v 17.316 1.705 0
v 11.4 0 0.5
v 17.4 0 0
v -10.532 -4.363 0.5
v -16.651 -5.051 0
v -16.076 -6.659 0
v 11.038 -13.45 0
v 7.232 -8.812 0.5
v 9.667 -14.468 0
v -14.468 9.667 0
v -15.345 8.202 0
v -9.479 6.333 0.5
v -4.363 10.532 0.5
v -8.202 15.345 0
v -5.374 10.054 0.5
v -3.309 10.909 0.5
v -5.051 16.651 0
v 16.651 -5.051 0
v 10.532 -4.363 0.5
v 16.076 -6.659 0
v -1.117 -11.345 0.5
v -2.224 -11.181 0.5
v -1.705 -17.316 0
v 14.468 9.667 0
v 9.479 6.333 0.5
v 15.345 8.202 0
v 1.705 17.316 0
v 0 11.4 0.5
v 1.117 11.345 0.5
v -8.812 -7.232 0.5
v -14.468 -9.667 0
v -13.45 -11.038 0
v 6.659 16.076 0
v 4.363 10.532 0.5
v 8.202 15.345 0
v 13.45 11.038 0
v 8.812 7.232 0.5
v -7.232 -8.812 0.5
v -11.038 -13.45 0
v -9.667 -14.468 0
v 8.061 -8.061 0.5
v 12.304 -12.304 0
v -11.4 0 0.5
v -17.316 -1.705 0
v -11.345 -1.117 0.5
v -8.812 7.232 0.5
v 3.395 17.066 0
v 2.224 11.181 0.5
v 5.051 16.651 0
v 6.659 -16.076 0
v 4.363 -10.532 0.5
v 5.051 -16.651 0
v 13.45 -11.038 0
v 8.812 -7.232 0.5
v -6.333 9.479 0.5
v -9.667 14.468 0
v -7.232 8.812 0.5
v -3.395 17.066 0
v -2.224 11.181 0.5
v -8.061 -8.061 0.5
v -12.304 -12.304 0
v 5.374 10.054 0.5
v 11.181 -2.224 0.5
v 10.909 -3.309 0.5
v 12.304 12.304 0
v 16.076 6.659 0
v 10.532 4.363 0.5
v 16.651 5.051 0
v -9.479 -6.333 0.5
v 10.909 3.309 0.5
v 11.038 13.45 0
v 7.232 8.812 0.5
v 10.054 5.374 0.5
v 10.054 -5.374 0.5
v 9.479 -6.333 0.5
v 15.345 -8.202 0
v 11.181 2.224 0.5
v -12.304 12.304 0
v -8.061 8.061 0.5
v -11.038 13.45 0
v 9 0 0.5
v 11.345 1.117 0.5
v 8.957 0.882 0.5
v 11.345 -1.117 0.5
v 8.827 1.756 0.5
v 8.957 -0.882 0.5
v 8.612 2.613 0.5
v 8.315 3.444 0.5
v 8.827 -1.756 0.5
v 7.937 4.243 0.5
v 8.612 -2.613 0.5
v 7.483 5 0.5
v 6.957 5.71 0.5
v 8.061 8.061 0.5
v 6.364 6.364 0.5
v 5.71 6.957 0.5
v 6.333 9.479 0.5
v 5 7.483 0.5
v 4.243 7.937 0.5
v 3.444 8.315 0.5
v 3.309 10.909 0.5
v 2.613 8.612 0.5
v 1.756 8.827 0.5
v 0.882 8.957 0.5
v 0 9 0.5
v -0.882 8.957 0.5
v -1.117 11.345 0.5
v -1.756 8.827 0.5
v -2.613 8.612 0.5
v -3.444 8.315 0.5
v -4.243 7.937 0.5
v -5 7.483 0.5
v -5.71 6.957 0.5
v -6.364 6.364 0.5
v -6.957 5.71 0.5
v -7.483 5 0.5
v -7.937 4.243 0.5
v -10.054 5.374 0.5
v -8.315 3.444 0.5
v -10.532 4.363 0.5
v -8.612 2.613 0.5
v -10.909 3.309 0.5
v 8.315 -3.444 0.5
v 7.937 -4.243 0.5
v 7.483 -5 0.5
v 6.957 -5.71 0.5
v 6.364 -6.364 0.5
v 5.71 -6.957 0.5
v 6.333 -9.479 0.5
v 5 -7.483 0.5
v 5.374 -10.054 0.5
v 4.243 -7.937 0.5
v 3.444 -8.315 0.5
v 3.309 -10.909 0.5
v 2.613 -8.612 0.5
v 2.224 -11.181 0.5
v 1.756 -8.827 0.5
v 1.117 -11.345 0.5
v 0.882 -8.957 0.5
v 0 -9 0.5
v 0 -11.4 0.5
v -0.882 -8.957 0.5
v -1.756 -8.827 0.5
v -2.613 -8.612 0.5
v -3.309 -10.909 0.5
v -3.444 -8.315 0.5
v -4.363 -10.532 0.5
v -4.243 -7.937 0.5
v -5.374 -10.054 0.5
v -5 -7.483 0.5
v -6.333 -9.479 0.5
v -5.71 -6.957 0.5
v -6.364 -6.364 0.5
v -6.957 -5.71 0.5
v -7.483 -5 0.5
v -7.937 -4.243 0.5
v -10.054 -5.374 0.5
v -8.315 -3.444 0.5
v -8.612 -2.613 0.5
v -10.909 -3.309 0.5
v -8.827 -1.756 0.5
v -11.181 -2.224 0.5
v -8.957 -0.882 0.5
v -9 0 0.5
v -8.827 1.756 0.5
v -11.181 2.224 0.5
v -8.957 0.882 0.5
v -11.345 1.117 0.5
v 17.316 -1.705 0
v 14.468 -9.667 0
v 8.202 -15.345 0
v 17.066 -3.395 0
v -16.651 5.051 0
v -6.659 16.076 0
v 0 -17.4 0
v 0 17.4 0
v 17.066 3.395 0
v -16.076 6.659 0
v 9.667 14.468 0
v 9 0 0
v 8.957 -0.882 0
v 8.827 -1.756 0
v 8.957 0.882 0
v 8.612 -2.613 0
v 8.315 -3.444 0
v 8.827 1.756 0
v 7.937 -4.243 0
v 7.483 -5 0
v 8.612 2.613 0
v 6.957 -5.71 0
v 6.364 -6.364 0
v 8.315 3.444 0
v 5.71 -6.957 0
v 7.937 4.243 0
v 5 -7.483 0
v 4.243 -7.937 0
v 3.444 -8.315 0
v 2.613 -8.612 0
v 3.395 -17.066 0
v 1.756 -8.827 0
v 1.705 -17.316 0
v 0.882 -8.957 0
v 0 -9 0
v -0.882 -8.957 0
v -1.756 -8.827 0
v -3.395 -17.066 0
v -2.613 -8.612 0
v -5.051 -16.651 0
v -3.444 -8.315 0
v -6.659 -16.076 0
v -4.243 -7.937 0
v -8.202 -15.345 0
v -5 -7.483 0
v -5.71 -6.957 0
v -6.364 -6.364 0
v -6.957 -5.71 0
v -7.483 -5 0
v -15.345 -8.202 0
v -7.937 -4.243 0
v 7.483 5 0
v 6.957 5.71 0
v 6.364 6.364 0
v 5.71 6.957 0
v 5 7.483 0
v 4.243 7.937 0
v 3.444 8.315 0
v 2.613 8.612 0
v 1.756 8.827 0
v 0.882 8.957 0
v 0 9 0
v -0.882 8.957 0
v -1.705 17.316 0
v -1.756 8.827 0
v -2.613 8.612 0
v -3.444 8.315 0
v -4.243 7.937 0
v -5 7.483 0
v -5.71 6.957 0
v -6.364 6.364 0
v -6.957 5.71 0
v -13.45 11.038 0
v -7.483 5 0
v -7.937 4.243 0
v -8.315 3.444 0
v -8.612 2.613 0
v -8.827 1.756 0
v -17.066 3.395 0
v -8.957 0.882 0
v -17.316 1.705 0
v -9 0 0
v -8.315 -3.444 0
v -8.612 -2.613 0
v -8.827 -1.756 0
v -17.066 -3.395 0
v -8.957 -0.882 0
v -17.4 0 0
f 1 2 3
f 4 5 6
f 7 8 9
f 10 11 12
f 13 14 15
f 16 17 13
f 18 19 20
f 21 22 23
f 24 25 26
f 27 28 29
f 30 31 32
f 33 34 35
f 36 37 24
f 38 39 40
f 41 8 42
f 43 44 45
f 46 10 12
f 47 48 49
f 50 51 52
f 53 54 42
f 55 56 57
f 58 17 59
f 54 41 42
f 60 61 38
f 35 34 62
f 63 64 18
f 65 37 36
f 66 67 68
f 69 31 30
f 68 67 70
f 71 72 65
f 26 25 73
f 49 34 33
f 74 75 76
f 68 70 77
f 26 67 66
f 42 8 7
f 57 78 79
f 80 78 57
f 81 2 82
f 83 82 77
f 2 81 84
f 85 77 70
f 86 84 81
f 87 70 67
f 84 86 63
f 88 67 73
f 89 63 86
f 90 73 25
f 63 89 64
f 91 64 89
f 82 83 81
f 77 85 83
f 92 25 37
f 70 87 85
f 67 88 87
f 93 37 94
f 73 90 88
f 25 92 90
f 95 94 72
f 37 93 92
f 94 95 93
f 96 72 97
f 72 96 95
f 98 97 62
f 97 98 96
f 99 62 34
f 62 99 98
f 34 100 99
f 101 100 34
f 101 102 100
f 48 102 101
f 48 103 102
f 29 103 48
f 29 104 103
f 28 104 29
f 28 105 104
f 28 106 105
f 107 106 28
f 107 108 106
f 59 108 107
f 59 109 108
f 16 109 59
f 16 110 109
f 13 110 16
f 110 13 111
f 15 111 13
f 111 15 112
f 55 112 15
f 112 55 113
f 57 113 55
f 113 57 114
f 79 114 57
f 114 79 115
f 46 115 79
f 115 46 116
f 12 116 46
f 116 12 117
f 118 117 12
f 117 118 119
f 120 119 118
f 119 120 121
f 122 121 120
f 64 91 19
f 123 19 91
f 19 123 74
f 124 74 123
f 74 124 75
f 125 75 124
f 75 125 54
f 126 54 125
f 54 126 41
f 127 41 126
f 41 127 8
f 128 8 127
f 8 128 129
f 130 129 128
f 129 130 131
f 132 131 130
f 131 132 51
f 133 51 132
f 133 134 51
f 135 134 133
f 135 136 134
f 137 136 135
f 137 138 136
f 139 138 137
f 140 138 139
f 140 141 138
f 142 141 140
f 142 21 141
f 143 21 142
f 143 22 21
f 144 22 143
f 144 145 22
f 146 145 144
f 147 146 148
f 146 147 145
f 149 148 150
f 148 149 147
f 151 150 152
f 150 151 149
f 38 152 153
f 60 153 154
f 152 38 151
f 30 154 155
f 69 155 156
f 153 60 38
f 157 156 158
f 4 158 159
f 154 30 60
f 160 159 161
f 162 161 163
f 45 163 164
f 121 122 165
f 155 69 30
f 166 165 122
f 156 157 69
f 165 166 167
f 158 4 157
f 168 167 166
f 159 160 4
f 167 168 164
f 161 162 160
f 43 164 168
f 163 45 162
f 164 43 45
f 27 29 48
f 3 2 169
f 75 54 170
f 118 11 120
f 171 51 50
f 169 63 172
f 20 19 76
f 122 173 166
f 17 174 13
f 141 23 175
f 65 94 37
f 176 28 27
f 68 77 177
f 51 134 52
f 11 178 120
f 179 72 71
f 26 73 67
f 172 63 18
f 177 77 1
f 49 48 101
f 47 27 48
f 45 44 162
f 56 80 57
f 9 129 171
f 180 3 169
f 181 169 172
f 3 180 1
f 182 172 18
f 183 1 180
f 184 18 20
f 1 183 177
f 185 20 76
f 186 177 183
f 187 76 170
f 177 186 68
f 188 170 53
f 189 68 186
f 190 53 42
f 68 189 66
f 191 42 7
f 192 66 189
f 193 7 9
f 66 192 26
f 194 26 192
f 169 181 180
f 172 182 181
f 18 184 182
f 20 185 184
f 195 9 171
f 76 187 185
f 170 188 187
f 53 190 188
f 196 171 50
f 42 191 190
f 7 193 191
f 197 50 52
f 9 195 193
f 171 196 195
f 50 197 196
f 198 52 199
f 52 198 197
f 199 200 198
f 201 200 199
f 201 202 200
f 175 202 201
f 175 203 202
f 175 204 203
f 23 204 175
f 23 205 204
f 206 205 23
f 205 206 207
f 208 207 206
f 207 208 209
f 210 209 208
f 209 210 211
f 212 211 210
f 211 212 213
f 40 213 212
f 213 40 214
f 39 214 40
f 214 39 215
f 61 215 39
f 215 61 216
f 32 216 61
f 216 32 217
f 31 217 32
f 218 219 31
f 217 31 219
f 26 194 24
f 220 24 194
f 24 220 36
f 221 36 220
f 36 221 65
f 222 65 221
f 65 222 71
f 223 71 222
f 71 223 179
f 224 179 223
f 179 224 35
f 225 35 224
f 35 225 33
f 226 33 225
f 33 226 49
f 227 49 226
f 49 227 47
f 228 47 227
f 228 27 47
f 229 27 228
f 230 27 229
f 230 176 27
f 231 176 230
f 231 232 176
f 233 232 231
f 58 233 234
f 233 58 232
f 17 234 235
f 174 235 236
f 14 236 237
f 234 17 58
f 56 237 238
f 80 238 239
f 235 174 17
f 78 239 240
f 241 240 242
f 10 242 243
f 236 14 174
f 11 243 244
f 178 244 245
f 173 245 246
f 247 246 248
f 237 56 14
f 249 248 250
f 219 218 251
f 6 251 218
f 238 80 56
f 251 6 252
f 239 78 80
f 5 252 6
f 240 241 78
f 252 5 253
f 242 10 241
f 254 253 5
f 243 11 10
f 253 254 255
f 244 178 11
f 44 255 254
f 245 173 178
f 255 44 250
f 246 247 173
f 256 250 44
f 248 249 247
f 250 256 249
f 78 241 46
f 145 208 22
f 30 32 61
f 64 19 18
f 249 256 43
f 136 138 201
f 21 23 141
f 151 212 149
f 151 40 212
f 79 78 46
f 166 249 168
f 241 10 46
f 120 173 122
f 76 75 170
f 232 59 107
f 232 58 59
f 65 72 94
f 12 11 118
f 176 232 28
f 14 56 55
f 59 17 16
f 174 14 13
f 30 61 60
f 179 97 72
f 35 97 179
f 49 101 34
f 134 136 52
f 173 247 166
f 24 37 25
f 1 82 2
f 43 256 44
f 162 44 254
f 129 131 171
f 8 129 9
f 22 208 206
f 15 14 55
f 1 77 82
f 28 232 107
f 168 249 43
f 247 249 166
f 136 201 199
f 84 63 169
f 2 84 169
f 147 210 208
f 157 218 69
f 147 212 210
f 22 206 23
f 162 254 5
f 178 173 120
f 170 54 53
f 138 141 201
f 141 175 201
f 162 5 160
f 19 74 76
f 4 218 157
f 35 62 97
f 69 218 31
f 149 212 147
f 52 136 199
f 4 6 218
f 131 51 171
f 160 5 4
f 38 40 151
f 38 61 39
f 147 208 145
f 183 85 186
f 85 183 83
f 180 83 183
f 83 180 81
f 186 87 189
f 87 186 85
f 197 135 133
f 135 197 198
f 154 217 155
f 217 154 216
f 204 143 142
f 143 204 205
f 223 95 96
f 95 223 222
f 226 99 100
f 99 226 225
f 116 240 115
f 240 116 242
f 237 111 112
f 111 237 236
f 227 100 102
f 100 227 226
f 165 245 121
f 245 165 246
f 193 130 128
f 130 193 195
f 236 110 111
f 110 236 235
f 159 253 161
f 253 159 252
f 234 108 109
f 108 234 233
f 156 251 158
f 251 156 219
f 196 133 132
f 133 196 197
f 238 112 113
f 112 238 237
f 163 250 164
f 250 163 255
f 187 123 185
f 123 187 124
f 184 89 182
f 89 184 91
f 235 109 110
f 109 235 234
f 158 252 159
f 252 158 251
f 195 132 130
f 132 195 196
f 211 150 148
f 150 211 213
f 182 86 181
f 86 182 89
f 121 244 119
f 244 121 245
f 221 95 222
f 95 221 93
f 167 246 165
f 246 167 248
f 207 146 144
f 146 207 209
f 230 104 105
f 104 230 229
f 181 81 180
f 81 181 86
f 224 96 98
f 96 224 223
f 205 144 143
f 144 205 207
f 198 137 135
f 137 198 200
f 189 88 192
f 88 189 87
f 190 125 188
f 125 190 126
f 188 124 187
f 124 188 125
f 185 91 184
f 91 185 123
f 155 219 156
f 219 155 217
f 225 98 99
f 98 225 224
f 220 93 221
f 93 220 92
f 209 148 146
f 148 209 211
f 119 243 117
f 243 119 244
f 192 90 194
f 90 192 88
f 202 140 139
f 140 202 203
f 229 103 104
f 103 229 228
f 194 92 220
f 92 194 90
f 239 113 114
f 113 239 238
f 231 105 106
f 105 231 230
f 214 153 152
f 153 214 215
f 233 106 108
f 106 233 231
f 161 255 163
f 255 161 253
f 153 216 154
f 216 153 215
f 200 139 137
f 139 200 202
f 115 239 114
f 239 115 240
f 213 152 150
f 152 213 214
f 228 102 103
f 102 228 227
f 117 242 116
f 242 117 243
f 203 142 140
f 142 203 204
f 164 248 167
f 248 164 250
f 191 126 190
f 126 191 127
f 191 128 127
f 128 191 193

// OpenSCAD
module radial() {
    difference() {
        cylinder(h=0.5, r1=17.4, r2=11.4, $fn=64);
        translate([0, 0, -1])
            cylinder(h=2, r=9, $fn=64);
    }
}

radial();
